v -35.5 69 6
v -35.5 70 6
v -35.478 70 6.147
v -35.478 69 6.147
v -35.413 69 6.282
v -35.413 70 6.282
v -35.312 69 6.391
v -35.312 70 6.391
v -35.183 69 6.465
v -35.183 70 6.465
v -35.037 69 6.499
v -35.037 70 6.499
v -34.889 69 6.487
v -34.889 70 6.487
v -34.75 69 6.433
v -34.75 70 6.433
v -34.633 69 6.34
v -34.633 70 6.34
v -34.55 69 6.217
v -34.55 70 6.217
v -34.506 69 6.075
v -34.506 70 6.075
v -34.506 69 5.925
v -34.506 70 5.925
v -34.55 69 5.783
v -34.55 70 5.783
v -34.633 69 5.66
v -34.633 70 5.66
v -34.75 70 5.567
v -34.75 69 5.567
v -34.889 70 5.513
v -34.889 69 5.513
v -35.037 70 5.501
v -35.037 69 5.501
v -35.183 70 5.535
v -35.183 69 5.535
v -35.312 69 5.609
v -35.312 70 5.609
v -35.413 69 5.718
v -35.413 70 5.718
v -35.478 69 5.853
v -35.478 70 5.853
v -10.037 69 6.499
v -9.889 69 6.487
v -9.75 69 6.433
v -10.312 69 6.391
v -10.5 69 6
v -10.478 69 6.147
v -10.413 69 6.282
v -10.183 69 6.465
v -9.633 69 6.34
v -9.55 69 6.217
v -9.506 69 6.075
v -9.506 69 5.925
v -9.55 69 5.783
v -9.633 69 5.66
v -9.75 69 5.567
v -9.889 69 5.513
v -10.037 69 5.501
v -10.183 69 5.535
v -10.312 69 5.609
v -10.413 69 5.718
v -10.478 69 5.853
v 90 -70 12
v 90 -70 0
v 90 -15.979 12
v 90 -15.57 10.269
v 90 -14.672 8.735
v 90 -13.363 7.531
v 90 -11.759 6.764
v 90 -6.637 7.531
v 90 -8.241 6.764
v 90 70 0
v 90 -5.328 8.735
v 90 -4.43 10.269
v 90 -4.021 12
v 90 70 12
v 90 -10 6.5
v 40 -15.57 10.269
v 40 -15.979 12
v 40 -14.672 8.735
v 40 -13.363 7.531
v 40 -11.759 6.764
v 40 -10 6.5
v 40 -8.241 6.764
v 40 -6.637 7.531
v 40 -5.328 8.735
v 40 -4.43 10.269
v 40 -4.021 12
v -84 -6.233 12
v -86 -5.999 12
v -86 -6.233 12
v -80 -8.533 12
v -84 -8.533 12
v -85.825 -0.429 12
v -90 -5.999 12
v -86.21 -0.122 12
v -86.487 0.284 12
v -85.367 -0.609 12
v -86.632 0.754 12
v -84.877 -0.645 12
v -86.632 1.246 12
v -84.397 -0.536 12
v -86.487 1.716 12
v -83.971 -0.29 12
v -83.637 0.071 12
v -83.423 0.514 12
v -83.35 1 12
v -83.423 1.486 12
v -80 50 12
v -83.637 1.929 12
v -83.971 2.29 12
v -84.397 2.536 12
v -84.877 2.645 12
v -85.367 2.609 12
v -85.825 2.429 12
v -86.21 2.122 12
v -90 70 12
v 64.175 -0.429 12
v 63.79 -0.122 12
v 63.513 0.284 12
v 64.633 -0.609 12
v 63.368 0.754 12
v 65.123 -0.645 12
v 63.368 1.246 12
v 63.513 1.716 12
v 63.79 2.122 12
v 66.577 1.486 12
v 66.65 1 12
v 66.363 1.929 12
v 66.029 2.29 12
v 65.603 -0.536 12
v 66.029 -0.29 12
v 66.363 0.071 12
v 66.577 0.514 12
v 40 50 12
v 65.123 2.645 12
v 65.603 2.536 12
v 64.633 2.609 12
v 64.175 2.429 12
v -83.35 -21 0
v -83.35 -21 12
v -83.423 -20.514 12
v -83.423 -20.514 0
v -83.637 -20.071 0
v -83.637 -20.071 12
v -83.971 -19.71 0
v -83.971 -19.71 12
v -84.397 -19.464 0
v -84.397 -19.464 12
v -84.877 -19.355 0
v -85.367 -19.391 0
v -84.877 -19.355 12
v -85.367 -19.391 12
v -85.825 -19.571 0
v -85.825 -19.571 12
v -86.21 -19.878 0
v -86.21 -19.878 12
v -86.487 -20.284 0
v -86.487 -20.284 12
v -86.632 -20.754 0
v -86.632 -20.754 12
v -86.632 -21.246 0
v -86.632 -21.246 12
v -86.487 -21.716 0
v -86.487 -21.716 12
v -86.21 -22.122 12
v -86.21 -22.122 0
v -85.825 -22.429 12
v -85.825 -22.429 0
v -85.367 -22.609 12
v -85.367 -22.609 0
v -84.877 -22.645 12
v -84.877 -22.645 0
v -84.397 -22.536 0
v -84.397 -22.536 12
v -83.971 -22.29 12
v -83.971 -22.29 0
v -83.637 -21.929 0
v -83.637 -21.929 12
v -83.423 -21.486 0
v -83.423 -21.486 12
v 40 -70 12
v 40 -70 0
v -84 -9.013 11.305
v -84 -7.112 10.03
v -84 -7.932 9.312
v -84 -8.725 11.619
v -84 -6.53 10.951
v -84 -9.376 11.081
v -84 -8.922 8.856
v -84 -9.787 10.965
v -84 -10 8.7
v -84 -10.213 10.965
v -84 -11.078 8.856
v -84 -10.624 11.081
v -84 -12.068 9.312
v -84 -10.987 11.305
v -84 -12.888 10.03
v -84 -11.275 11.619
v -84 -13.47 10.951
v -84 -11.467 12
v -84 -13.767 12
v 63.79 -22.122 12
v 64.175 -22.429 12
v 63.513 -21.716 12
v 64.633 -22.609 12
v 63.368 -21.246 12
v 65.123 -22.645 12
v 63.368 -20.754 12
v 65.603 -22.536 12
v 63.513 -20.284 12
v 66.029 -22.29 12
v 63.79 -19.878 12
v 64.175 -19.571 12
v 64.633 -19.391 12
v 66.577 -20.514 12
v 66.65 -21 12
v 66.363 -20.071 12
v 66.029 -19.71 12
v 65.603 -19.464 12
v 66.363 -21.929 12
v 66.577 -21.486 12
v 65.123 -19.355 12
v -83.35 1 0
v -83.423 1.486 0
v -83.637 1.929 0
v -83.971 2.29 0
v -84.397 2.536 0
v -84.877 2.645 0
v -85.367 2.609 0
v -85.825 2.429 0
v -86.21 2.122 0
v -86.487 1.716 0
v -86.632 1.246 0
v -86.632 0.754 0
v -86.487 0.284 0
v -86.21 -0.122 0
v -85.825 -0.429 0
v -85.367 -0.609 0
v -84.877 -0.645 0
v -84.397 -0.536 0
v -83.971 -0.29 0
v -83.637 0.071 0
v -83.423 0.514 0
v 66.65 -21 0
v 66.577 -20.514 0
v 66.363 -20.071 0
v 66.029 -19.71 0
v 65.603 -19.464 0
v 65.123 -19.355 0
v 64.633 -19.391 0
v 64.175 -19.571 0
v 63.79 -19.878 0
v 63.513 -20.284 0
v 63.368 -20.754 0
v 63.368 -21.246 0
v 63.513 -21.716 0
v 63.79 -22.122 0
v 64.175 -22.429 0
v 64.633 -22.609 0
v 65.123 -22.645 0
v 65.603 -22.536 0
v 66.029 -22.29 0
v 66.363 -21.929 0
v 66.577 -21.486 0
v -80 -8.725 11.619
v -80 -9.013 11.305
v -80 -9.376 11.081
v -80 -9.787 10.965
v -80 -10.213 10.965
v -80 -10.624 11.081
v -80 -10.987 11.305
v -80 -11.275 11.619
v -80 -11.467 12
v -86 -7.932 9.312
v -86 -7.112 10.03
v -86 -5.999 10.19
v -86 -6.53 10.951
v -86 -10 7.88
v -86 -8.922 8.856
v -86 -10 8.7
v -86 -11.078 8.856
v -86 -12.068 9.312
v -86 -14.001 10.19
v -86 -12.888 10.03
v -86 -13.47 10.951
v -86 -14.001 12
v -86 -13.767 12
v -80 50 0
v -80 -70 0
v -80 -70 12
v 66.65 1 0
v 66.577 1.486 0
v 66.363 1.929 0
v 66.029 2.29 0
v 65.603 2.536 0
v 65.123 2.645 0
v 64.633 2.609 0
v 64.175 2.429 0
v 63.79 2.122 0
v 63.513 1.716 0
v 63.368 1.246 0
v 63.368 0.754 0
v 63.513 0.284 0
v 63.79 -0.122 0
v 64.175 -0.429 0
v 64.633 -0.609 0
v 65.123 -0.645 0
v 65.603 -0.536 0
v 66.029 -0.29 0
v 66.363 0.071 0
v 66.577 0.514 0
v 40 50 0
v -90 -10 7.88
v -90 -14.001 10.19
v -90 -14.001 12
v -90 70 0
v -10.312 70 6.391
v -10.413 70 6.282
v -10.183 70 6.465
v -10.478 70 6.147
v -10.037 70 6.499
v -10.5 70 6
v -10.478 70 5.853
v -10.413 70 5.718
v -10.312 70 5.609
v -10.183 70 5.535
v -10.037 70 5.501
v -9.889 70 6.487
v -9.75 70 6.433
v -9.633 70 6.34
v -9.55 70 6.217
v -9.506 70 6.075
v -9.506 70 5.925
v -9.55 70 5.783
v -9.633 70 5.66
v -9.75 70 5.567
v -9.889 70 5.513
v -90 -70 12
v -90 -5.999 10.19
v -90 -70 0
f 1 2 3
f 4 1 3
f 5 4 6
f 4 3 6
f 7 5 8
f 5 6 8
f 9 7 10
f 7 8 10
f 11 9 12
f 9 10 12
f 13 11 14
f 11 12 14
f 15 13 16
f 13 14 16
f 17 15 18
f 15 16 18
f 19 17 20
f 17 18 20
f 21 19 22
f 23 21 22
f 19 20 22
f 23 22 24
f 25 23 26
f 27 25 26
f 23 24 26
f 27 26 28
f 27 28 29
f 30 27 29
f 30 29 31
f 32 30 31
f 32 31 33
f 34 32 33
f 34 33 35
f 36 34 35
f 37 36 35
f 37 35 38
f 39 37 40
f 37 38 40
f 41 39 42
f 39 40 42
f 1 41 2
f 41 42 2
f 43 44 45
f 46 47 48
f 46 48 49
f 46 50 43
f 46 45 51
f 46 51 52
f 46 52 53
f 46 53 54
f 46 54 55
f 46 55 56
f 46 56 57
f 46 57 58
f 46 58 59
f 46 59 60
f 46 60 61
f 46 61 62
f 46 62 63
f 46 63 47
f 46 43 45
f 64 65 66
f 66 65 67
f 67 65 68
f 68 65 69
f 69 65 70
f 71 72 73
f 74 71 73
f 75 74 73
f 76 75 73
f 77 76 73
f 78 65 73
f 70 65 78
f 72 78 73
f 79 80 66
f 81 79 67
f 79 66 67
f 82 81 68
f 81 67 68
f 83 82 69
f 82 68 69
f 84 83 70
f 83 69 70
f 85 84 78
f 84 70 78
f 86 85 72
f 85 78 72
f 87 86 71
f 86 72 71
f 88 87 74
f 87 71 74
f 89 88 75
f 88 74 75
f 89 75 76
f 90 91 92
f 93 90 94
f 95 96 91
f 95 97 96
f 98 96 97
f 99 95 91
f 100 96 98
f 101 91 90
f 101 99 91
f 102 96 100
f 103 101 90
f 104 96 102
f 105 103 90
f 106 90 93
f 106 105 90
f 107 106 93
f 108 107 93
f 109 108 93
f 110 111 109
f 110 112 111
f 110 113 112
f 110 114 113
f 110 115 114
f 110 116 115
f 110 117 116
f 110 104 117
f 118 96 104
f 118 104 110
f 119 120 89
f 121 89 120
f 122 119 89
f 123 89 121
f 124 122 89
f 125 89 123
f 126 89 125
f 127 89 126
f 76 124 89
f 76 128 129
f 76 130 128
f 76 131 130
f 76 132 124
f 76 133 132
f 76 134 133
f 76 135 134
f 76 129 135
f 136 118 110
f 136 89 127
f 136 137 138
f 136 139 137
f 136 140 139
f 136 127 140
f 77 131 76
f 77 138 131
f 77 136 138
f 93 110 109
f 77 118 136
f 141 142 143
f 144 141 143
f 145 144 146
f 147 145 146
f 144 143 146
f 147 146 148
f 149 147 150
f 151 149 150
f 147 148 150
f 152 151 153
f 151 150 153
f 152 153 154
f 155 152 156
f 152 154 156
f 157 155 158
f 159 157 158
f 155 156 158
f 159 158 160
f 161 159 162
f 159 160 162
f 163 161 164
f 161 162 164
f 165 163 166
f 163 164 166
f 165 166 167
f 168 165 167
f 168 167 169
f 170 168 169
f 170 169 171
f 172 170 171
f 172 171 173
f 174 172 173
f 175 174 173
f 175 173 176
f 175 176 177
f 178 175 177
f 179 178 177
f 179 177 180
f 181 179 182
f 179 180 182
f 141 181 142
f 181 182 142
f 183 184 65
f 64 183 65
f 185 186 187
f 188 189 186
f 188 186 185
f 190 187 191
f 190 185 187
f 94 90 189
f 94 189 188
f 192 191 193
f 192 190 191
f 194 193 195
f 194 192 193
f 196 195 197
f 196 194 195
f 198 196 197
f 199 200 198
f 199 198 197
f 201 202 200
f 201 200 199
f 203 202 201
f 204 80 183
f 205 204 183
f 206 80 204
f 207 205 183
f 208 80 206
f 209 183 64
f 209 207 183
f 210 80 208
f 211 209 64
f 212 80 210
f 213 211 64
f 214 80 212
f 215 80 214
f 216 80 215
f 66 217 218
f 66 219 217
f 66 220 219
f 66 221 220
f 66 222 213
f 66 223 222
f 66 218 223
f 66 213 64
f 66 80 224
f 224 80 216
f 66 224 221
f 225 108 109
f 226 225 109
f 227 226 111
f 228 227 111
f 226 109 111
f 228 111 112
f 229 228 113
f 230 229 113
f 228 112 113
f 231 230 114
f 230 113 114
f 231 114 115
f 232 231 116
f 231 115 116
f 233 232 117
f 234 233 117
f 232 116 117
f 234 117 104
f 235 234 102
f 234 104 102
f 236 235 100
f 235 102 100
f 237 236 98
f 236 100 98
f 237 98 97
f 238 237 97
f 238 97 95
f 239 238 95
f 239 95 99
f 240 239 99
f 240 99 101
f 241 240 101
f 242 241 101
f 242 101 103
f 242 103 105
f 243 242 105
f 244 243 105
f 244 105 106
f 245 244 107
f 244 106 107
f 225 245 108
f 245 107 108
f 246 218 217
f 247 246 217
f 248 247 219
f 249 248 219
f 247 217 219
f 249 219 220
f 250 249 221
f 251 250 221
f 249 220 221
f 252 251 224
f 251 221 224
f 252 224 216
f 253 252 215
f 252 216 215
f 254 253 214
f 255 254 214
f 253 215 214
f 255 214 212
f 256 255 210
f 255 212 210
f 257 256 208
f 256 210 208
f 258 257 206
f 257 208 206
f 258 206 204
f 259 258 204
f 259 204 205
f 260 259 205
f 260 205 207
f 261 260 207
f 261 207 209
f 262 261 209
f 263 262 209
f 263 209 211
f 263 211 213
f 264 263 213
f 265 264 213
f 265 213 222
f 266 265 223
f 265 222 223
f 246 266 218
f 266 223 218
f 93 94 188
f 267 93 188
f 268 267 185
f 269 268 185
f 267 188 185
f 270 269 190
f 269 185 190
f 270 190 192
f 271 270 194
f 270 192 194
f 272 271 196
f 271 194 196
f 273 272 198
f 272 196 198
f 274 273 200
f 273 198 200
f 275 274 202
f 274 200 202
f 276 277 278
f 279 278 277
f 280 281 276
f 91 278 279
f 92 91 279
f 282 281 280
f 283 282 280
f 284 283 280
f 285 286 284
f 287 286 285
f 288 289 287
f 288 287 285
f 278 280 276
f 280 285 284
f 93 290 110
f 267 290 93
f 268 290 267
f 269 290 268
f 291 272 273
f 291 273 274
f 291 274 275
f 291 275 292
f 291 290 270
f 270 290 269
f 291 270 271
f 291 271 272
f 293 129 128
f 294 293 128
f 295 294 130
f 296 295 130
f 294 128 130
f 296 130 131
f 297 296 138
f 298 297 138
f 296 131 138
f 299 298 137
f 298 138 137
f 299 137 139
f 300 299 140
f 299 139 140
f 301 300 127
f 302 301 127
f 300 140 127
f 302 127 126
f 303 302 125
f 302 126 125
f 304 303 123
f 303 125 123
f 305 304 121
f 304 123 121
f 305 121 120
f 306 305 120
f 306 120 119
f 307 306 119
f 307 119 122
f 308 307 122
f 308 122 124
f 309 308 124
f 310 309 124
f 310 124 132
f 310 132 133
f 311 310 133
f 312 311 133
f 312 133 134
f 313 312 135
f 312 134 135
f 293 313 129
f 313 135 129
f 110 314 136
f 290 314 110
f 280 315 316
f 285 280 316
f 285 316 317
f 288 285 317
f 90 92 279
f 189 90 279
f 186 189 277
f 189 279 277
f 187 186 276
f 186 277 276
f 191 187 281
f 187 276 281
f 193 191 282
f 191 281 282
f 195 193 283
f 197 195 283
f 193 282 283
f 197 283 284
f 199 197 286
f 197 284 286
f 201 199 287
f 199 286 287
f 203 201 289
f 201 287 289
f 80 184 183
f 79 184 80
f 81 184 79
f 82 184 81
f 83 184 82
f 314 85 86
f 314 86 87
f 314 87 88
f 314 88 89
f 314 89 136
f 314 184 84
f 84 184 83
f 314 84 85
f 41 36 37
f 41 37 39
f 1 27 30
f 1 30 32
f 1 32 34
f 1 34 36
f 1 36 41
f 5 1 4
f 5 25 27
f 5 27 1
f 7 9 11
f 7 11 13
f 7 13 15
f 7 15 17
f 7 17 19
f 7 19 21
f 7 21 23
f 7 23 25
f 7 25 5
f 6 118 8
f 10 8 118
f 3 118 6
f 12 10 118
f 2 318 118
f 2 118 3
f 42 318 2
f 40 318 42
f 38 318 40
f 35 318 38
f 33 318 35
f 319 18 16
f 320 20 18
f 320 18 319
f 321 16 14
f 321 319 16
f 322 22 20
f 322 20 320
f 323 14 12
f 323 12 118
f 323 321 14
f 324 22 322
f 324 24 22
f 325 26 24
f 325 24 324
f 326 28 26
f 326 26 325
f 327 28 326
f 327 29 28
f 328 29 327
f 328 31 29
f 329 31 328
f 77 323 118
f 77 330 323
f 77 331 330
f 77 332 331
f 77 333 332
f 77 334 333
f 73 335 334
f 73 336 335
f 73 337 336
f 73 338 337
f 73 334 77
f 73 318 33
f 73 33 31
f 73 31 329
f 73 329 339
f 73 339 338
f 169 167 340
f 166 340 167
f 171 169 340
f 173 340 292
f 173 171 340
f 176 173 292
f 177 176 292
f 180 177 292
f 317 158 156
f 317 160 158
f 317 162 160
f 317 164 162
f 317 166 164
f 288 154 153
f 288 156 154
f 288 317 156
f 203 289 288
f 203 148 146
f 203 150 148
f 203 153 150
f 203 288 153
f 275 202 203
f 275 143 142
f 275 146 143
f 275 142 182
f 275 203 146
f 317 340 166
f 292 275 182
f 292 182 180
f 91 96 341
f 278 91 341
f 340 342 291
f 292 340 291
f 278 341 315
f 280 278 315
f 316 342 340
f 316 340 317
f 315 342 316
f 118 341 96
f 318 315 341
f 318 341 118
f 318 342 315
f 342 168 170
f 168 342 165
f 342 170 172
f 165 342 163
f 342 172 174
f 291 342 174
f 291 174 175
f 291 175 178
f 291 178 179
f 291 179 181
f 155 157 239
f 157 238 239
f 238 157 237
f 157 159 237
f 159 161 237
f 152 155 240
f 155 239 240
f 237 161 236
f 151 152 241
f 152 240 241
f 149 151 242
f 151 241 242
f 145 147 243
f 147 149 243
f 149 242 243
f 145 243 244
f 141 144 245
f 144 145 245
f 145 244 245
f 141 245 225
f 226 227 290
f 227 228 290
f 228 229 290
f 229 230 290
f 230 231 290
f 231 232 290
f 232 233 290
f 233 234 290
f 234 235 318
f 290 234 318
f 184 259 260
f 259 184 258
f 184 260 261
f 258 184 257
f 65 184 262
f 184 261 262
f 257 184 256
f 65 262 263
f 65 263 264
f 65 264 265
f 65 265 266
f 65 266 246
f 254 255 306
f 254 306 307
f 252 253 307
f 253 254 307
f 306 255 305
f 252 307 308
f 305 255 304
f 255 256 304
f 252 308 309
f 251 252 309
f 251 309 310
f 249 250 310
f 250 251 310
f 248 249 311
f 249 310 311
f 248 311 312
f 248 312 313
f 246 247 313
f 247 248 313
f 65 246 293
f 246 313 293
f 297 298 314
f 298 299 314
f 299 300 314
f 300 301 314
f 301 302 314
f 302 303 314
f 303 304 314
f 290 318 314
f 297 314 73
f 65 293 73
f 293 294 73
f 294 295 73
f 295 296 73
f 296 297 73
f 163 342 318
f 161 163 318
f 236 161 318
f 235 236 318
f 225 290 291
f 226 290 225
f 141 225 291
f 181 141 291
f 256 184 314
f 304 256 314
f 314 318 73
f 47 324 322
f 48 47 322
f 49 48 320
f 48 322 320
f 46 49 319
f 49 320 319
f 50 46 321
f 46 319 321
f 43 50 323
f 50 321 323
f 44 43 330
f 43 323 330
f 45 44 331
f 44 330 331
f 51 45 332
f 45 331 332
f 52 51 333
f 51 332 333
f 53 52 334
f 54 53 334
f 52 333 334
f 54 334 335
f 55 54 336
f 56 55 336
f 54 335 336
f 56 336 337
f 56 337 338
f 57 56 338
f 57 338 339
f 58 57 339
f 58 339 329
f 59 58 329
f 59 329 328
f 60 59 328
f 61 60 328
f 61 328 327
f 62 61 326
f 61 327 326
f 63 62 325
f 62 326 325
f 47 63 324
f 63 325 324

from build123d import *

# Parameters (mm, degrees)
F0_W      = 180
F0_H      = 140
F1_DEPTH  = 30
F4_DEPTH  = 30
F5_DEPTH  = 4
F6_R      = 3.8
F7_DEPTH  = 2
F8_R      = 1.55
F9_DEPTH  = 7
F10_R     = 6
F12_DEPTH = 50
F11_R     = 0.5
F13_DEPTH = 1
F14_W     = 180
F14_H     = 140
F15_DEPTH = 18
F16_R     = 1.65
F17_DEPTH = 12


# Not quite as in the source:
# - a feature names something its author has since deleted; it is built from what else it names


with BuildPart() as f1:
    # F0 (on Top) → F1 (new body)
    with BuildSketch(Plane.XY):
        Rectangle(F0_W, F0_H)
    extrude(amount=F1_DEPTH)

    # F3 (on Top) → F4 (cut, through all)
    with BuildSketch(Plane.XY):
        Polygon((40, -70), (40, 0), (40, 50), (0, 50), (-80, 50), (-80, -70), align=None)
    extrude(amount=F4_DEPTH, mode=Mode.SUBTRACT)

    # F2 (on face) → F5 (cut)
    with BuildSketch(Plane(origin=(-90, 0, 0), x_dir=(0, -1, 0), z_dir=(-1, 0, 0))):
        Polygon((10, 17.12), (5.9989626345, 14.81), (5.9989626345, 10.19), (10, 7.88), (14.0010373655, 10.19), (14.0010373655, 14.81), align=None)
    extrude(amount=-F5_DEPTH, mode=Mode.SUBTRACT)

    # F6 (on face) → F7 (cut)
    with BuildSketch(Plane(origin=(-86, 0, 0), x_dir=(0, -1, 0), z_dir=(-1, 0, 0))):
        with Locations((10, 12.5)):
            Circle(F6_R)
    extrude(amount=-F7_DEPTH, mode=Mode.SUBTRACT)

    # F8 (on face) → F9 (cut)
    with BuildSketch(Plane(origin=(-84, 0, 0), x_dir=(0, -1, 0), z_dir=(-1, 0, 0))):
        with Locations((10, 12.5)):
            Circle(F8_R)
    extrude(amount=-F9_DEPTH, mode=Mode.SUBTRACT)

    # F10 (on face) → F12 (cut, through all)
    with BuildSketch(Plane.YZ.offset(90)):
        with Locations((-10, 12.5)):
            Circle(F10_R)
    extrude(amount=-F12_DEPTH, mode=Mode.SUBTRACT)

    # F11 (on face) → F13 (cut)
    with BuildSketch(Plane(origin=(0, 70, 0), x_dir=(-1, 0, 0), z_dir=(0, 1, 0))):
        with Locations((35, 6)):
            Circle(F11_R)
        with Locations((10, 6)):
            Circle(F11_R)
    extrude(amount=-F13_DEPTH, mode=Mode.SUBTRACT)

    # F14 (on face) → F15 (cut)
    with BuildSketch(Plane.XY.offset(30)):
        Rectangle(F14_W, F14_H)
    extrude(amount=-F15_DEPTH, mode=Mode.SUBTRACT)

    # F16 (on face) → F17 (cut, through all)
    with BuildSketch(Plane.XY.offset(12)):
        with Locations((65, 1)):
            Circle(F16_R)
        with Locations((65, -21)):
            Circle(F16_R)
        with Locations((-85, 1)):
            Circle(F16_R)
        with Locations((-85, -21)):
            Circle(F16_R)
    extrude(amount=-F17_DEPTH, mode=Mode.SUBTRACT)


solid = f1.part
